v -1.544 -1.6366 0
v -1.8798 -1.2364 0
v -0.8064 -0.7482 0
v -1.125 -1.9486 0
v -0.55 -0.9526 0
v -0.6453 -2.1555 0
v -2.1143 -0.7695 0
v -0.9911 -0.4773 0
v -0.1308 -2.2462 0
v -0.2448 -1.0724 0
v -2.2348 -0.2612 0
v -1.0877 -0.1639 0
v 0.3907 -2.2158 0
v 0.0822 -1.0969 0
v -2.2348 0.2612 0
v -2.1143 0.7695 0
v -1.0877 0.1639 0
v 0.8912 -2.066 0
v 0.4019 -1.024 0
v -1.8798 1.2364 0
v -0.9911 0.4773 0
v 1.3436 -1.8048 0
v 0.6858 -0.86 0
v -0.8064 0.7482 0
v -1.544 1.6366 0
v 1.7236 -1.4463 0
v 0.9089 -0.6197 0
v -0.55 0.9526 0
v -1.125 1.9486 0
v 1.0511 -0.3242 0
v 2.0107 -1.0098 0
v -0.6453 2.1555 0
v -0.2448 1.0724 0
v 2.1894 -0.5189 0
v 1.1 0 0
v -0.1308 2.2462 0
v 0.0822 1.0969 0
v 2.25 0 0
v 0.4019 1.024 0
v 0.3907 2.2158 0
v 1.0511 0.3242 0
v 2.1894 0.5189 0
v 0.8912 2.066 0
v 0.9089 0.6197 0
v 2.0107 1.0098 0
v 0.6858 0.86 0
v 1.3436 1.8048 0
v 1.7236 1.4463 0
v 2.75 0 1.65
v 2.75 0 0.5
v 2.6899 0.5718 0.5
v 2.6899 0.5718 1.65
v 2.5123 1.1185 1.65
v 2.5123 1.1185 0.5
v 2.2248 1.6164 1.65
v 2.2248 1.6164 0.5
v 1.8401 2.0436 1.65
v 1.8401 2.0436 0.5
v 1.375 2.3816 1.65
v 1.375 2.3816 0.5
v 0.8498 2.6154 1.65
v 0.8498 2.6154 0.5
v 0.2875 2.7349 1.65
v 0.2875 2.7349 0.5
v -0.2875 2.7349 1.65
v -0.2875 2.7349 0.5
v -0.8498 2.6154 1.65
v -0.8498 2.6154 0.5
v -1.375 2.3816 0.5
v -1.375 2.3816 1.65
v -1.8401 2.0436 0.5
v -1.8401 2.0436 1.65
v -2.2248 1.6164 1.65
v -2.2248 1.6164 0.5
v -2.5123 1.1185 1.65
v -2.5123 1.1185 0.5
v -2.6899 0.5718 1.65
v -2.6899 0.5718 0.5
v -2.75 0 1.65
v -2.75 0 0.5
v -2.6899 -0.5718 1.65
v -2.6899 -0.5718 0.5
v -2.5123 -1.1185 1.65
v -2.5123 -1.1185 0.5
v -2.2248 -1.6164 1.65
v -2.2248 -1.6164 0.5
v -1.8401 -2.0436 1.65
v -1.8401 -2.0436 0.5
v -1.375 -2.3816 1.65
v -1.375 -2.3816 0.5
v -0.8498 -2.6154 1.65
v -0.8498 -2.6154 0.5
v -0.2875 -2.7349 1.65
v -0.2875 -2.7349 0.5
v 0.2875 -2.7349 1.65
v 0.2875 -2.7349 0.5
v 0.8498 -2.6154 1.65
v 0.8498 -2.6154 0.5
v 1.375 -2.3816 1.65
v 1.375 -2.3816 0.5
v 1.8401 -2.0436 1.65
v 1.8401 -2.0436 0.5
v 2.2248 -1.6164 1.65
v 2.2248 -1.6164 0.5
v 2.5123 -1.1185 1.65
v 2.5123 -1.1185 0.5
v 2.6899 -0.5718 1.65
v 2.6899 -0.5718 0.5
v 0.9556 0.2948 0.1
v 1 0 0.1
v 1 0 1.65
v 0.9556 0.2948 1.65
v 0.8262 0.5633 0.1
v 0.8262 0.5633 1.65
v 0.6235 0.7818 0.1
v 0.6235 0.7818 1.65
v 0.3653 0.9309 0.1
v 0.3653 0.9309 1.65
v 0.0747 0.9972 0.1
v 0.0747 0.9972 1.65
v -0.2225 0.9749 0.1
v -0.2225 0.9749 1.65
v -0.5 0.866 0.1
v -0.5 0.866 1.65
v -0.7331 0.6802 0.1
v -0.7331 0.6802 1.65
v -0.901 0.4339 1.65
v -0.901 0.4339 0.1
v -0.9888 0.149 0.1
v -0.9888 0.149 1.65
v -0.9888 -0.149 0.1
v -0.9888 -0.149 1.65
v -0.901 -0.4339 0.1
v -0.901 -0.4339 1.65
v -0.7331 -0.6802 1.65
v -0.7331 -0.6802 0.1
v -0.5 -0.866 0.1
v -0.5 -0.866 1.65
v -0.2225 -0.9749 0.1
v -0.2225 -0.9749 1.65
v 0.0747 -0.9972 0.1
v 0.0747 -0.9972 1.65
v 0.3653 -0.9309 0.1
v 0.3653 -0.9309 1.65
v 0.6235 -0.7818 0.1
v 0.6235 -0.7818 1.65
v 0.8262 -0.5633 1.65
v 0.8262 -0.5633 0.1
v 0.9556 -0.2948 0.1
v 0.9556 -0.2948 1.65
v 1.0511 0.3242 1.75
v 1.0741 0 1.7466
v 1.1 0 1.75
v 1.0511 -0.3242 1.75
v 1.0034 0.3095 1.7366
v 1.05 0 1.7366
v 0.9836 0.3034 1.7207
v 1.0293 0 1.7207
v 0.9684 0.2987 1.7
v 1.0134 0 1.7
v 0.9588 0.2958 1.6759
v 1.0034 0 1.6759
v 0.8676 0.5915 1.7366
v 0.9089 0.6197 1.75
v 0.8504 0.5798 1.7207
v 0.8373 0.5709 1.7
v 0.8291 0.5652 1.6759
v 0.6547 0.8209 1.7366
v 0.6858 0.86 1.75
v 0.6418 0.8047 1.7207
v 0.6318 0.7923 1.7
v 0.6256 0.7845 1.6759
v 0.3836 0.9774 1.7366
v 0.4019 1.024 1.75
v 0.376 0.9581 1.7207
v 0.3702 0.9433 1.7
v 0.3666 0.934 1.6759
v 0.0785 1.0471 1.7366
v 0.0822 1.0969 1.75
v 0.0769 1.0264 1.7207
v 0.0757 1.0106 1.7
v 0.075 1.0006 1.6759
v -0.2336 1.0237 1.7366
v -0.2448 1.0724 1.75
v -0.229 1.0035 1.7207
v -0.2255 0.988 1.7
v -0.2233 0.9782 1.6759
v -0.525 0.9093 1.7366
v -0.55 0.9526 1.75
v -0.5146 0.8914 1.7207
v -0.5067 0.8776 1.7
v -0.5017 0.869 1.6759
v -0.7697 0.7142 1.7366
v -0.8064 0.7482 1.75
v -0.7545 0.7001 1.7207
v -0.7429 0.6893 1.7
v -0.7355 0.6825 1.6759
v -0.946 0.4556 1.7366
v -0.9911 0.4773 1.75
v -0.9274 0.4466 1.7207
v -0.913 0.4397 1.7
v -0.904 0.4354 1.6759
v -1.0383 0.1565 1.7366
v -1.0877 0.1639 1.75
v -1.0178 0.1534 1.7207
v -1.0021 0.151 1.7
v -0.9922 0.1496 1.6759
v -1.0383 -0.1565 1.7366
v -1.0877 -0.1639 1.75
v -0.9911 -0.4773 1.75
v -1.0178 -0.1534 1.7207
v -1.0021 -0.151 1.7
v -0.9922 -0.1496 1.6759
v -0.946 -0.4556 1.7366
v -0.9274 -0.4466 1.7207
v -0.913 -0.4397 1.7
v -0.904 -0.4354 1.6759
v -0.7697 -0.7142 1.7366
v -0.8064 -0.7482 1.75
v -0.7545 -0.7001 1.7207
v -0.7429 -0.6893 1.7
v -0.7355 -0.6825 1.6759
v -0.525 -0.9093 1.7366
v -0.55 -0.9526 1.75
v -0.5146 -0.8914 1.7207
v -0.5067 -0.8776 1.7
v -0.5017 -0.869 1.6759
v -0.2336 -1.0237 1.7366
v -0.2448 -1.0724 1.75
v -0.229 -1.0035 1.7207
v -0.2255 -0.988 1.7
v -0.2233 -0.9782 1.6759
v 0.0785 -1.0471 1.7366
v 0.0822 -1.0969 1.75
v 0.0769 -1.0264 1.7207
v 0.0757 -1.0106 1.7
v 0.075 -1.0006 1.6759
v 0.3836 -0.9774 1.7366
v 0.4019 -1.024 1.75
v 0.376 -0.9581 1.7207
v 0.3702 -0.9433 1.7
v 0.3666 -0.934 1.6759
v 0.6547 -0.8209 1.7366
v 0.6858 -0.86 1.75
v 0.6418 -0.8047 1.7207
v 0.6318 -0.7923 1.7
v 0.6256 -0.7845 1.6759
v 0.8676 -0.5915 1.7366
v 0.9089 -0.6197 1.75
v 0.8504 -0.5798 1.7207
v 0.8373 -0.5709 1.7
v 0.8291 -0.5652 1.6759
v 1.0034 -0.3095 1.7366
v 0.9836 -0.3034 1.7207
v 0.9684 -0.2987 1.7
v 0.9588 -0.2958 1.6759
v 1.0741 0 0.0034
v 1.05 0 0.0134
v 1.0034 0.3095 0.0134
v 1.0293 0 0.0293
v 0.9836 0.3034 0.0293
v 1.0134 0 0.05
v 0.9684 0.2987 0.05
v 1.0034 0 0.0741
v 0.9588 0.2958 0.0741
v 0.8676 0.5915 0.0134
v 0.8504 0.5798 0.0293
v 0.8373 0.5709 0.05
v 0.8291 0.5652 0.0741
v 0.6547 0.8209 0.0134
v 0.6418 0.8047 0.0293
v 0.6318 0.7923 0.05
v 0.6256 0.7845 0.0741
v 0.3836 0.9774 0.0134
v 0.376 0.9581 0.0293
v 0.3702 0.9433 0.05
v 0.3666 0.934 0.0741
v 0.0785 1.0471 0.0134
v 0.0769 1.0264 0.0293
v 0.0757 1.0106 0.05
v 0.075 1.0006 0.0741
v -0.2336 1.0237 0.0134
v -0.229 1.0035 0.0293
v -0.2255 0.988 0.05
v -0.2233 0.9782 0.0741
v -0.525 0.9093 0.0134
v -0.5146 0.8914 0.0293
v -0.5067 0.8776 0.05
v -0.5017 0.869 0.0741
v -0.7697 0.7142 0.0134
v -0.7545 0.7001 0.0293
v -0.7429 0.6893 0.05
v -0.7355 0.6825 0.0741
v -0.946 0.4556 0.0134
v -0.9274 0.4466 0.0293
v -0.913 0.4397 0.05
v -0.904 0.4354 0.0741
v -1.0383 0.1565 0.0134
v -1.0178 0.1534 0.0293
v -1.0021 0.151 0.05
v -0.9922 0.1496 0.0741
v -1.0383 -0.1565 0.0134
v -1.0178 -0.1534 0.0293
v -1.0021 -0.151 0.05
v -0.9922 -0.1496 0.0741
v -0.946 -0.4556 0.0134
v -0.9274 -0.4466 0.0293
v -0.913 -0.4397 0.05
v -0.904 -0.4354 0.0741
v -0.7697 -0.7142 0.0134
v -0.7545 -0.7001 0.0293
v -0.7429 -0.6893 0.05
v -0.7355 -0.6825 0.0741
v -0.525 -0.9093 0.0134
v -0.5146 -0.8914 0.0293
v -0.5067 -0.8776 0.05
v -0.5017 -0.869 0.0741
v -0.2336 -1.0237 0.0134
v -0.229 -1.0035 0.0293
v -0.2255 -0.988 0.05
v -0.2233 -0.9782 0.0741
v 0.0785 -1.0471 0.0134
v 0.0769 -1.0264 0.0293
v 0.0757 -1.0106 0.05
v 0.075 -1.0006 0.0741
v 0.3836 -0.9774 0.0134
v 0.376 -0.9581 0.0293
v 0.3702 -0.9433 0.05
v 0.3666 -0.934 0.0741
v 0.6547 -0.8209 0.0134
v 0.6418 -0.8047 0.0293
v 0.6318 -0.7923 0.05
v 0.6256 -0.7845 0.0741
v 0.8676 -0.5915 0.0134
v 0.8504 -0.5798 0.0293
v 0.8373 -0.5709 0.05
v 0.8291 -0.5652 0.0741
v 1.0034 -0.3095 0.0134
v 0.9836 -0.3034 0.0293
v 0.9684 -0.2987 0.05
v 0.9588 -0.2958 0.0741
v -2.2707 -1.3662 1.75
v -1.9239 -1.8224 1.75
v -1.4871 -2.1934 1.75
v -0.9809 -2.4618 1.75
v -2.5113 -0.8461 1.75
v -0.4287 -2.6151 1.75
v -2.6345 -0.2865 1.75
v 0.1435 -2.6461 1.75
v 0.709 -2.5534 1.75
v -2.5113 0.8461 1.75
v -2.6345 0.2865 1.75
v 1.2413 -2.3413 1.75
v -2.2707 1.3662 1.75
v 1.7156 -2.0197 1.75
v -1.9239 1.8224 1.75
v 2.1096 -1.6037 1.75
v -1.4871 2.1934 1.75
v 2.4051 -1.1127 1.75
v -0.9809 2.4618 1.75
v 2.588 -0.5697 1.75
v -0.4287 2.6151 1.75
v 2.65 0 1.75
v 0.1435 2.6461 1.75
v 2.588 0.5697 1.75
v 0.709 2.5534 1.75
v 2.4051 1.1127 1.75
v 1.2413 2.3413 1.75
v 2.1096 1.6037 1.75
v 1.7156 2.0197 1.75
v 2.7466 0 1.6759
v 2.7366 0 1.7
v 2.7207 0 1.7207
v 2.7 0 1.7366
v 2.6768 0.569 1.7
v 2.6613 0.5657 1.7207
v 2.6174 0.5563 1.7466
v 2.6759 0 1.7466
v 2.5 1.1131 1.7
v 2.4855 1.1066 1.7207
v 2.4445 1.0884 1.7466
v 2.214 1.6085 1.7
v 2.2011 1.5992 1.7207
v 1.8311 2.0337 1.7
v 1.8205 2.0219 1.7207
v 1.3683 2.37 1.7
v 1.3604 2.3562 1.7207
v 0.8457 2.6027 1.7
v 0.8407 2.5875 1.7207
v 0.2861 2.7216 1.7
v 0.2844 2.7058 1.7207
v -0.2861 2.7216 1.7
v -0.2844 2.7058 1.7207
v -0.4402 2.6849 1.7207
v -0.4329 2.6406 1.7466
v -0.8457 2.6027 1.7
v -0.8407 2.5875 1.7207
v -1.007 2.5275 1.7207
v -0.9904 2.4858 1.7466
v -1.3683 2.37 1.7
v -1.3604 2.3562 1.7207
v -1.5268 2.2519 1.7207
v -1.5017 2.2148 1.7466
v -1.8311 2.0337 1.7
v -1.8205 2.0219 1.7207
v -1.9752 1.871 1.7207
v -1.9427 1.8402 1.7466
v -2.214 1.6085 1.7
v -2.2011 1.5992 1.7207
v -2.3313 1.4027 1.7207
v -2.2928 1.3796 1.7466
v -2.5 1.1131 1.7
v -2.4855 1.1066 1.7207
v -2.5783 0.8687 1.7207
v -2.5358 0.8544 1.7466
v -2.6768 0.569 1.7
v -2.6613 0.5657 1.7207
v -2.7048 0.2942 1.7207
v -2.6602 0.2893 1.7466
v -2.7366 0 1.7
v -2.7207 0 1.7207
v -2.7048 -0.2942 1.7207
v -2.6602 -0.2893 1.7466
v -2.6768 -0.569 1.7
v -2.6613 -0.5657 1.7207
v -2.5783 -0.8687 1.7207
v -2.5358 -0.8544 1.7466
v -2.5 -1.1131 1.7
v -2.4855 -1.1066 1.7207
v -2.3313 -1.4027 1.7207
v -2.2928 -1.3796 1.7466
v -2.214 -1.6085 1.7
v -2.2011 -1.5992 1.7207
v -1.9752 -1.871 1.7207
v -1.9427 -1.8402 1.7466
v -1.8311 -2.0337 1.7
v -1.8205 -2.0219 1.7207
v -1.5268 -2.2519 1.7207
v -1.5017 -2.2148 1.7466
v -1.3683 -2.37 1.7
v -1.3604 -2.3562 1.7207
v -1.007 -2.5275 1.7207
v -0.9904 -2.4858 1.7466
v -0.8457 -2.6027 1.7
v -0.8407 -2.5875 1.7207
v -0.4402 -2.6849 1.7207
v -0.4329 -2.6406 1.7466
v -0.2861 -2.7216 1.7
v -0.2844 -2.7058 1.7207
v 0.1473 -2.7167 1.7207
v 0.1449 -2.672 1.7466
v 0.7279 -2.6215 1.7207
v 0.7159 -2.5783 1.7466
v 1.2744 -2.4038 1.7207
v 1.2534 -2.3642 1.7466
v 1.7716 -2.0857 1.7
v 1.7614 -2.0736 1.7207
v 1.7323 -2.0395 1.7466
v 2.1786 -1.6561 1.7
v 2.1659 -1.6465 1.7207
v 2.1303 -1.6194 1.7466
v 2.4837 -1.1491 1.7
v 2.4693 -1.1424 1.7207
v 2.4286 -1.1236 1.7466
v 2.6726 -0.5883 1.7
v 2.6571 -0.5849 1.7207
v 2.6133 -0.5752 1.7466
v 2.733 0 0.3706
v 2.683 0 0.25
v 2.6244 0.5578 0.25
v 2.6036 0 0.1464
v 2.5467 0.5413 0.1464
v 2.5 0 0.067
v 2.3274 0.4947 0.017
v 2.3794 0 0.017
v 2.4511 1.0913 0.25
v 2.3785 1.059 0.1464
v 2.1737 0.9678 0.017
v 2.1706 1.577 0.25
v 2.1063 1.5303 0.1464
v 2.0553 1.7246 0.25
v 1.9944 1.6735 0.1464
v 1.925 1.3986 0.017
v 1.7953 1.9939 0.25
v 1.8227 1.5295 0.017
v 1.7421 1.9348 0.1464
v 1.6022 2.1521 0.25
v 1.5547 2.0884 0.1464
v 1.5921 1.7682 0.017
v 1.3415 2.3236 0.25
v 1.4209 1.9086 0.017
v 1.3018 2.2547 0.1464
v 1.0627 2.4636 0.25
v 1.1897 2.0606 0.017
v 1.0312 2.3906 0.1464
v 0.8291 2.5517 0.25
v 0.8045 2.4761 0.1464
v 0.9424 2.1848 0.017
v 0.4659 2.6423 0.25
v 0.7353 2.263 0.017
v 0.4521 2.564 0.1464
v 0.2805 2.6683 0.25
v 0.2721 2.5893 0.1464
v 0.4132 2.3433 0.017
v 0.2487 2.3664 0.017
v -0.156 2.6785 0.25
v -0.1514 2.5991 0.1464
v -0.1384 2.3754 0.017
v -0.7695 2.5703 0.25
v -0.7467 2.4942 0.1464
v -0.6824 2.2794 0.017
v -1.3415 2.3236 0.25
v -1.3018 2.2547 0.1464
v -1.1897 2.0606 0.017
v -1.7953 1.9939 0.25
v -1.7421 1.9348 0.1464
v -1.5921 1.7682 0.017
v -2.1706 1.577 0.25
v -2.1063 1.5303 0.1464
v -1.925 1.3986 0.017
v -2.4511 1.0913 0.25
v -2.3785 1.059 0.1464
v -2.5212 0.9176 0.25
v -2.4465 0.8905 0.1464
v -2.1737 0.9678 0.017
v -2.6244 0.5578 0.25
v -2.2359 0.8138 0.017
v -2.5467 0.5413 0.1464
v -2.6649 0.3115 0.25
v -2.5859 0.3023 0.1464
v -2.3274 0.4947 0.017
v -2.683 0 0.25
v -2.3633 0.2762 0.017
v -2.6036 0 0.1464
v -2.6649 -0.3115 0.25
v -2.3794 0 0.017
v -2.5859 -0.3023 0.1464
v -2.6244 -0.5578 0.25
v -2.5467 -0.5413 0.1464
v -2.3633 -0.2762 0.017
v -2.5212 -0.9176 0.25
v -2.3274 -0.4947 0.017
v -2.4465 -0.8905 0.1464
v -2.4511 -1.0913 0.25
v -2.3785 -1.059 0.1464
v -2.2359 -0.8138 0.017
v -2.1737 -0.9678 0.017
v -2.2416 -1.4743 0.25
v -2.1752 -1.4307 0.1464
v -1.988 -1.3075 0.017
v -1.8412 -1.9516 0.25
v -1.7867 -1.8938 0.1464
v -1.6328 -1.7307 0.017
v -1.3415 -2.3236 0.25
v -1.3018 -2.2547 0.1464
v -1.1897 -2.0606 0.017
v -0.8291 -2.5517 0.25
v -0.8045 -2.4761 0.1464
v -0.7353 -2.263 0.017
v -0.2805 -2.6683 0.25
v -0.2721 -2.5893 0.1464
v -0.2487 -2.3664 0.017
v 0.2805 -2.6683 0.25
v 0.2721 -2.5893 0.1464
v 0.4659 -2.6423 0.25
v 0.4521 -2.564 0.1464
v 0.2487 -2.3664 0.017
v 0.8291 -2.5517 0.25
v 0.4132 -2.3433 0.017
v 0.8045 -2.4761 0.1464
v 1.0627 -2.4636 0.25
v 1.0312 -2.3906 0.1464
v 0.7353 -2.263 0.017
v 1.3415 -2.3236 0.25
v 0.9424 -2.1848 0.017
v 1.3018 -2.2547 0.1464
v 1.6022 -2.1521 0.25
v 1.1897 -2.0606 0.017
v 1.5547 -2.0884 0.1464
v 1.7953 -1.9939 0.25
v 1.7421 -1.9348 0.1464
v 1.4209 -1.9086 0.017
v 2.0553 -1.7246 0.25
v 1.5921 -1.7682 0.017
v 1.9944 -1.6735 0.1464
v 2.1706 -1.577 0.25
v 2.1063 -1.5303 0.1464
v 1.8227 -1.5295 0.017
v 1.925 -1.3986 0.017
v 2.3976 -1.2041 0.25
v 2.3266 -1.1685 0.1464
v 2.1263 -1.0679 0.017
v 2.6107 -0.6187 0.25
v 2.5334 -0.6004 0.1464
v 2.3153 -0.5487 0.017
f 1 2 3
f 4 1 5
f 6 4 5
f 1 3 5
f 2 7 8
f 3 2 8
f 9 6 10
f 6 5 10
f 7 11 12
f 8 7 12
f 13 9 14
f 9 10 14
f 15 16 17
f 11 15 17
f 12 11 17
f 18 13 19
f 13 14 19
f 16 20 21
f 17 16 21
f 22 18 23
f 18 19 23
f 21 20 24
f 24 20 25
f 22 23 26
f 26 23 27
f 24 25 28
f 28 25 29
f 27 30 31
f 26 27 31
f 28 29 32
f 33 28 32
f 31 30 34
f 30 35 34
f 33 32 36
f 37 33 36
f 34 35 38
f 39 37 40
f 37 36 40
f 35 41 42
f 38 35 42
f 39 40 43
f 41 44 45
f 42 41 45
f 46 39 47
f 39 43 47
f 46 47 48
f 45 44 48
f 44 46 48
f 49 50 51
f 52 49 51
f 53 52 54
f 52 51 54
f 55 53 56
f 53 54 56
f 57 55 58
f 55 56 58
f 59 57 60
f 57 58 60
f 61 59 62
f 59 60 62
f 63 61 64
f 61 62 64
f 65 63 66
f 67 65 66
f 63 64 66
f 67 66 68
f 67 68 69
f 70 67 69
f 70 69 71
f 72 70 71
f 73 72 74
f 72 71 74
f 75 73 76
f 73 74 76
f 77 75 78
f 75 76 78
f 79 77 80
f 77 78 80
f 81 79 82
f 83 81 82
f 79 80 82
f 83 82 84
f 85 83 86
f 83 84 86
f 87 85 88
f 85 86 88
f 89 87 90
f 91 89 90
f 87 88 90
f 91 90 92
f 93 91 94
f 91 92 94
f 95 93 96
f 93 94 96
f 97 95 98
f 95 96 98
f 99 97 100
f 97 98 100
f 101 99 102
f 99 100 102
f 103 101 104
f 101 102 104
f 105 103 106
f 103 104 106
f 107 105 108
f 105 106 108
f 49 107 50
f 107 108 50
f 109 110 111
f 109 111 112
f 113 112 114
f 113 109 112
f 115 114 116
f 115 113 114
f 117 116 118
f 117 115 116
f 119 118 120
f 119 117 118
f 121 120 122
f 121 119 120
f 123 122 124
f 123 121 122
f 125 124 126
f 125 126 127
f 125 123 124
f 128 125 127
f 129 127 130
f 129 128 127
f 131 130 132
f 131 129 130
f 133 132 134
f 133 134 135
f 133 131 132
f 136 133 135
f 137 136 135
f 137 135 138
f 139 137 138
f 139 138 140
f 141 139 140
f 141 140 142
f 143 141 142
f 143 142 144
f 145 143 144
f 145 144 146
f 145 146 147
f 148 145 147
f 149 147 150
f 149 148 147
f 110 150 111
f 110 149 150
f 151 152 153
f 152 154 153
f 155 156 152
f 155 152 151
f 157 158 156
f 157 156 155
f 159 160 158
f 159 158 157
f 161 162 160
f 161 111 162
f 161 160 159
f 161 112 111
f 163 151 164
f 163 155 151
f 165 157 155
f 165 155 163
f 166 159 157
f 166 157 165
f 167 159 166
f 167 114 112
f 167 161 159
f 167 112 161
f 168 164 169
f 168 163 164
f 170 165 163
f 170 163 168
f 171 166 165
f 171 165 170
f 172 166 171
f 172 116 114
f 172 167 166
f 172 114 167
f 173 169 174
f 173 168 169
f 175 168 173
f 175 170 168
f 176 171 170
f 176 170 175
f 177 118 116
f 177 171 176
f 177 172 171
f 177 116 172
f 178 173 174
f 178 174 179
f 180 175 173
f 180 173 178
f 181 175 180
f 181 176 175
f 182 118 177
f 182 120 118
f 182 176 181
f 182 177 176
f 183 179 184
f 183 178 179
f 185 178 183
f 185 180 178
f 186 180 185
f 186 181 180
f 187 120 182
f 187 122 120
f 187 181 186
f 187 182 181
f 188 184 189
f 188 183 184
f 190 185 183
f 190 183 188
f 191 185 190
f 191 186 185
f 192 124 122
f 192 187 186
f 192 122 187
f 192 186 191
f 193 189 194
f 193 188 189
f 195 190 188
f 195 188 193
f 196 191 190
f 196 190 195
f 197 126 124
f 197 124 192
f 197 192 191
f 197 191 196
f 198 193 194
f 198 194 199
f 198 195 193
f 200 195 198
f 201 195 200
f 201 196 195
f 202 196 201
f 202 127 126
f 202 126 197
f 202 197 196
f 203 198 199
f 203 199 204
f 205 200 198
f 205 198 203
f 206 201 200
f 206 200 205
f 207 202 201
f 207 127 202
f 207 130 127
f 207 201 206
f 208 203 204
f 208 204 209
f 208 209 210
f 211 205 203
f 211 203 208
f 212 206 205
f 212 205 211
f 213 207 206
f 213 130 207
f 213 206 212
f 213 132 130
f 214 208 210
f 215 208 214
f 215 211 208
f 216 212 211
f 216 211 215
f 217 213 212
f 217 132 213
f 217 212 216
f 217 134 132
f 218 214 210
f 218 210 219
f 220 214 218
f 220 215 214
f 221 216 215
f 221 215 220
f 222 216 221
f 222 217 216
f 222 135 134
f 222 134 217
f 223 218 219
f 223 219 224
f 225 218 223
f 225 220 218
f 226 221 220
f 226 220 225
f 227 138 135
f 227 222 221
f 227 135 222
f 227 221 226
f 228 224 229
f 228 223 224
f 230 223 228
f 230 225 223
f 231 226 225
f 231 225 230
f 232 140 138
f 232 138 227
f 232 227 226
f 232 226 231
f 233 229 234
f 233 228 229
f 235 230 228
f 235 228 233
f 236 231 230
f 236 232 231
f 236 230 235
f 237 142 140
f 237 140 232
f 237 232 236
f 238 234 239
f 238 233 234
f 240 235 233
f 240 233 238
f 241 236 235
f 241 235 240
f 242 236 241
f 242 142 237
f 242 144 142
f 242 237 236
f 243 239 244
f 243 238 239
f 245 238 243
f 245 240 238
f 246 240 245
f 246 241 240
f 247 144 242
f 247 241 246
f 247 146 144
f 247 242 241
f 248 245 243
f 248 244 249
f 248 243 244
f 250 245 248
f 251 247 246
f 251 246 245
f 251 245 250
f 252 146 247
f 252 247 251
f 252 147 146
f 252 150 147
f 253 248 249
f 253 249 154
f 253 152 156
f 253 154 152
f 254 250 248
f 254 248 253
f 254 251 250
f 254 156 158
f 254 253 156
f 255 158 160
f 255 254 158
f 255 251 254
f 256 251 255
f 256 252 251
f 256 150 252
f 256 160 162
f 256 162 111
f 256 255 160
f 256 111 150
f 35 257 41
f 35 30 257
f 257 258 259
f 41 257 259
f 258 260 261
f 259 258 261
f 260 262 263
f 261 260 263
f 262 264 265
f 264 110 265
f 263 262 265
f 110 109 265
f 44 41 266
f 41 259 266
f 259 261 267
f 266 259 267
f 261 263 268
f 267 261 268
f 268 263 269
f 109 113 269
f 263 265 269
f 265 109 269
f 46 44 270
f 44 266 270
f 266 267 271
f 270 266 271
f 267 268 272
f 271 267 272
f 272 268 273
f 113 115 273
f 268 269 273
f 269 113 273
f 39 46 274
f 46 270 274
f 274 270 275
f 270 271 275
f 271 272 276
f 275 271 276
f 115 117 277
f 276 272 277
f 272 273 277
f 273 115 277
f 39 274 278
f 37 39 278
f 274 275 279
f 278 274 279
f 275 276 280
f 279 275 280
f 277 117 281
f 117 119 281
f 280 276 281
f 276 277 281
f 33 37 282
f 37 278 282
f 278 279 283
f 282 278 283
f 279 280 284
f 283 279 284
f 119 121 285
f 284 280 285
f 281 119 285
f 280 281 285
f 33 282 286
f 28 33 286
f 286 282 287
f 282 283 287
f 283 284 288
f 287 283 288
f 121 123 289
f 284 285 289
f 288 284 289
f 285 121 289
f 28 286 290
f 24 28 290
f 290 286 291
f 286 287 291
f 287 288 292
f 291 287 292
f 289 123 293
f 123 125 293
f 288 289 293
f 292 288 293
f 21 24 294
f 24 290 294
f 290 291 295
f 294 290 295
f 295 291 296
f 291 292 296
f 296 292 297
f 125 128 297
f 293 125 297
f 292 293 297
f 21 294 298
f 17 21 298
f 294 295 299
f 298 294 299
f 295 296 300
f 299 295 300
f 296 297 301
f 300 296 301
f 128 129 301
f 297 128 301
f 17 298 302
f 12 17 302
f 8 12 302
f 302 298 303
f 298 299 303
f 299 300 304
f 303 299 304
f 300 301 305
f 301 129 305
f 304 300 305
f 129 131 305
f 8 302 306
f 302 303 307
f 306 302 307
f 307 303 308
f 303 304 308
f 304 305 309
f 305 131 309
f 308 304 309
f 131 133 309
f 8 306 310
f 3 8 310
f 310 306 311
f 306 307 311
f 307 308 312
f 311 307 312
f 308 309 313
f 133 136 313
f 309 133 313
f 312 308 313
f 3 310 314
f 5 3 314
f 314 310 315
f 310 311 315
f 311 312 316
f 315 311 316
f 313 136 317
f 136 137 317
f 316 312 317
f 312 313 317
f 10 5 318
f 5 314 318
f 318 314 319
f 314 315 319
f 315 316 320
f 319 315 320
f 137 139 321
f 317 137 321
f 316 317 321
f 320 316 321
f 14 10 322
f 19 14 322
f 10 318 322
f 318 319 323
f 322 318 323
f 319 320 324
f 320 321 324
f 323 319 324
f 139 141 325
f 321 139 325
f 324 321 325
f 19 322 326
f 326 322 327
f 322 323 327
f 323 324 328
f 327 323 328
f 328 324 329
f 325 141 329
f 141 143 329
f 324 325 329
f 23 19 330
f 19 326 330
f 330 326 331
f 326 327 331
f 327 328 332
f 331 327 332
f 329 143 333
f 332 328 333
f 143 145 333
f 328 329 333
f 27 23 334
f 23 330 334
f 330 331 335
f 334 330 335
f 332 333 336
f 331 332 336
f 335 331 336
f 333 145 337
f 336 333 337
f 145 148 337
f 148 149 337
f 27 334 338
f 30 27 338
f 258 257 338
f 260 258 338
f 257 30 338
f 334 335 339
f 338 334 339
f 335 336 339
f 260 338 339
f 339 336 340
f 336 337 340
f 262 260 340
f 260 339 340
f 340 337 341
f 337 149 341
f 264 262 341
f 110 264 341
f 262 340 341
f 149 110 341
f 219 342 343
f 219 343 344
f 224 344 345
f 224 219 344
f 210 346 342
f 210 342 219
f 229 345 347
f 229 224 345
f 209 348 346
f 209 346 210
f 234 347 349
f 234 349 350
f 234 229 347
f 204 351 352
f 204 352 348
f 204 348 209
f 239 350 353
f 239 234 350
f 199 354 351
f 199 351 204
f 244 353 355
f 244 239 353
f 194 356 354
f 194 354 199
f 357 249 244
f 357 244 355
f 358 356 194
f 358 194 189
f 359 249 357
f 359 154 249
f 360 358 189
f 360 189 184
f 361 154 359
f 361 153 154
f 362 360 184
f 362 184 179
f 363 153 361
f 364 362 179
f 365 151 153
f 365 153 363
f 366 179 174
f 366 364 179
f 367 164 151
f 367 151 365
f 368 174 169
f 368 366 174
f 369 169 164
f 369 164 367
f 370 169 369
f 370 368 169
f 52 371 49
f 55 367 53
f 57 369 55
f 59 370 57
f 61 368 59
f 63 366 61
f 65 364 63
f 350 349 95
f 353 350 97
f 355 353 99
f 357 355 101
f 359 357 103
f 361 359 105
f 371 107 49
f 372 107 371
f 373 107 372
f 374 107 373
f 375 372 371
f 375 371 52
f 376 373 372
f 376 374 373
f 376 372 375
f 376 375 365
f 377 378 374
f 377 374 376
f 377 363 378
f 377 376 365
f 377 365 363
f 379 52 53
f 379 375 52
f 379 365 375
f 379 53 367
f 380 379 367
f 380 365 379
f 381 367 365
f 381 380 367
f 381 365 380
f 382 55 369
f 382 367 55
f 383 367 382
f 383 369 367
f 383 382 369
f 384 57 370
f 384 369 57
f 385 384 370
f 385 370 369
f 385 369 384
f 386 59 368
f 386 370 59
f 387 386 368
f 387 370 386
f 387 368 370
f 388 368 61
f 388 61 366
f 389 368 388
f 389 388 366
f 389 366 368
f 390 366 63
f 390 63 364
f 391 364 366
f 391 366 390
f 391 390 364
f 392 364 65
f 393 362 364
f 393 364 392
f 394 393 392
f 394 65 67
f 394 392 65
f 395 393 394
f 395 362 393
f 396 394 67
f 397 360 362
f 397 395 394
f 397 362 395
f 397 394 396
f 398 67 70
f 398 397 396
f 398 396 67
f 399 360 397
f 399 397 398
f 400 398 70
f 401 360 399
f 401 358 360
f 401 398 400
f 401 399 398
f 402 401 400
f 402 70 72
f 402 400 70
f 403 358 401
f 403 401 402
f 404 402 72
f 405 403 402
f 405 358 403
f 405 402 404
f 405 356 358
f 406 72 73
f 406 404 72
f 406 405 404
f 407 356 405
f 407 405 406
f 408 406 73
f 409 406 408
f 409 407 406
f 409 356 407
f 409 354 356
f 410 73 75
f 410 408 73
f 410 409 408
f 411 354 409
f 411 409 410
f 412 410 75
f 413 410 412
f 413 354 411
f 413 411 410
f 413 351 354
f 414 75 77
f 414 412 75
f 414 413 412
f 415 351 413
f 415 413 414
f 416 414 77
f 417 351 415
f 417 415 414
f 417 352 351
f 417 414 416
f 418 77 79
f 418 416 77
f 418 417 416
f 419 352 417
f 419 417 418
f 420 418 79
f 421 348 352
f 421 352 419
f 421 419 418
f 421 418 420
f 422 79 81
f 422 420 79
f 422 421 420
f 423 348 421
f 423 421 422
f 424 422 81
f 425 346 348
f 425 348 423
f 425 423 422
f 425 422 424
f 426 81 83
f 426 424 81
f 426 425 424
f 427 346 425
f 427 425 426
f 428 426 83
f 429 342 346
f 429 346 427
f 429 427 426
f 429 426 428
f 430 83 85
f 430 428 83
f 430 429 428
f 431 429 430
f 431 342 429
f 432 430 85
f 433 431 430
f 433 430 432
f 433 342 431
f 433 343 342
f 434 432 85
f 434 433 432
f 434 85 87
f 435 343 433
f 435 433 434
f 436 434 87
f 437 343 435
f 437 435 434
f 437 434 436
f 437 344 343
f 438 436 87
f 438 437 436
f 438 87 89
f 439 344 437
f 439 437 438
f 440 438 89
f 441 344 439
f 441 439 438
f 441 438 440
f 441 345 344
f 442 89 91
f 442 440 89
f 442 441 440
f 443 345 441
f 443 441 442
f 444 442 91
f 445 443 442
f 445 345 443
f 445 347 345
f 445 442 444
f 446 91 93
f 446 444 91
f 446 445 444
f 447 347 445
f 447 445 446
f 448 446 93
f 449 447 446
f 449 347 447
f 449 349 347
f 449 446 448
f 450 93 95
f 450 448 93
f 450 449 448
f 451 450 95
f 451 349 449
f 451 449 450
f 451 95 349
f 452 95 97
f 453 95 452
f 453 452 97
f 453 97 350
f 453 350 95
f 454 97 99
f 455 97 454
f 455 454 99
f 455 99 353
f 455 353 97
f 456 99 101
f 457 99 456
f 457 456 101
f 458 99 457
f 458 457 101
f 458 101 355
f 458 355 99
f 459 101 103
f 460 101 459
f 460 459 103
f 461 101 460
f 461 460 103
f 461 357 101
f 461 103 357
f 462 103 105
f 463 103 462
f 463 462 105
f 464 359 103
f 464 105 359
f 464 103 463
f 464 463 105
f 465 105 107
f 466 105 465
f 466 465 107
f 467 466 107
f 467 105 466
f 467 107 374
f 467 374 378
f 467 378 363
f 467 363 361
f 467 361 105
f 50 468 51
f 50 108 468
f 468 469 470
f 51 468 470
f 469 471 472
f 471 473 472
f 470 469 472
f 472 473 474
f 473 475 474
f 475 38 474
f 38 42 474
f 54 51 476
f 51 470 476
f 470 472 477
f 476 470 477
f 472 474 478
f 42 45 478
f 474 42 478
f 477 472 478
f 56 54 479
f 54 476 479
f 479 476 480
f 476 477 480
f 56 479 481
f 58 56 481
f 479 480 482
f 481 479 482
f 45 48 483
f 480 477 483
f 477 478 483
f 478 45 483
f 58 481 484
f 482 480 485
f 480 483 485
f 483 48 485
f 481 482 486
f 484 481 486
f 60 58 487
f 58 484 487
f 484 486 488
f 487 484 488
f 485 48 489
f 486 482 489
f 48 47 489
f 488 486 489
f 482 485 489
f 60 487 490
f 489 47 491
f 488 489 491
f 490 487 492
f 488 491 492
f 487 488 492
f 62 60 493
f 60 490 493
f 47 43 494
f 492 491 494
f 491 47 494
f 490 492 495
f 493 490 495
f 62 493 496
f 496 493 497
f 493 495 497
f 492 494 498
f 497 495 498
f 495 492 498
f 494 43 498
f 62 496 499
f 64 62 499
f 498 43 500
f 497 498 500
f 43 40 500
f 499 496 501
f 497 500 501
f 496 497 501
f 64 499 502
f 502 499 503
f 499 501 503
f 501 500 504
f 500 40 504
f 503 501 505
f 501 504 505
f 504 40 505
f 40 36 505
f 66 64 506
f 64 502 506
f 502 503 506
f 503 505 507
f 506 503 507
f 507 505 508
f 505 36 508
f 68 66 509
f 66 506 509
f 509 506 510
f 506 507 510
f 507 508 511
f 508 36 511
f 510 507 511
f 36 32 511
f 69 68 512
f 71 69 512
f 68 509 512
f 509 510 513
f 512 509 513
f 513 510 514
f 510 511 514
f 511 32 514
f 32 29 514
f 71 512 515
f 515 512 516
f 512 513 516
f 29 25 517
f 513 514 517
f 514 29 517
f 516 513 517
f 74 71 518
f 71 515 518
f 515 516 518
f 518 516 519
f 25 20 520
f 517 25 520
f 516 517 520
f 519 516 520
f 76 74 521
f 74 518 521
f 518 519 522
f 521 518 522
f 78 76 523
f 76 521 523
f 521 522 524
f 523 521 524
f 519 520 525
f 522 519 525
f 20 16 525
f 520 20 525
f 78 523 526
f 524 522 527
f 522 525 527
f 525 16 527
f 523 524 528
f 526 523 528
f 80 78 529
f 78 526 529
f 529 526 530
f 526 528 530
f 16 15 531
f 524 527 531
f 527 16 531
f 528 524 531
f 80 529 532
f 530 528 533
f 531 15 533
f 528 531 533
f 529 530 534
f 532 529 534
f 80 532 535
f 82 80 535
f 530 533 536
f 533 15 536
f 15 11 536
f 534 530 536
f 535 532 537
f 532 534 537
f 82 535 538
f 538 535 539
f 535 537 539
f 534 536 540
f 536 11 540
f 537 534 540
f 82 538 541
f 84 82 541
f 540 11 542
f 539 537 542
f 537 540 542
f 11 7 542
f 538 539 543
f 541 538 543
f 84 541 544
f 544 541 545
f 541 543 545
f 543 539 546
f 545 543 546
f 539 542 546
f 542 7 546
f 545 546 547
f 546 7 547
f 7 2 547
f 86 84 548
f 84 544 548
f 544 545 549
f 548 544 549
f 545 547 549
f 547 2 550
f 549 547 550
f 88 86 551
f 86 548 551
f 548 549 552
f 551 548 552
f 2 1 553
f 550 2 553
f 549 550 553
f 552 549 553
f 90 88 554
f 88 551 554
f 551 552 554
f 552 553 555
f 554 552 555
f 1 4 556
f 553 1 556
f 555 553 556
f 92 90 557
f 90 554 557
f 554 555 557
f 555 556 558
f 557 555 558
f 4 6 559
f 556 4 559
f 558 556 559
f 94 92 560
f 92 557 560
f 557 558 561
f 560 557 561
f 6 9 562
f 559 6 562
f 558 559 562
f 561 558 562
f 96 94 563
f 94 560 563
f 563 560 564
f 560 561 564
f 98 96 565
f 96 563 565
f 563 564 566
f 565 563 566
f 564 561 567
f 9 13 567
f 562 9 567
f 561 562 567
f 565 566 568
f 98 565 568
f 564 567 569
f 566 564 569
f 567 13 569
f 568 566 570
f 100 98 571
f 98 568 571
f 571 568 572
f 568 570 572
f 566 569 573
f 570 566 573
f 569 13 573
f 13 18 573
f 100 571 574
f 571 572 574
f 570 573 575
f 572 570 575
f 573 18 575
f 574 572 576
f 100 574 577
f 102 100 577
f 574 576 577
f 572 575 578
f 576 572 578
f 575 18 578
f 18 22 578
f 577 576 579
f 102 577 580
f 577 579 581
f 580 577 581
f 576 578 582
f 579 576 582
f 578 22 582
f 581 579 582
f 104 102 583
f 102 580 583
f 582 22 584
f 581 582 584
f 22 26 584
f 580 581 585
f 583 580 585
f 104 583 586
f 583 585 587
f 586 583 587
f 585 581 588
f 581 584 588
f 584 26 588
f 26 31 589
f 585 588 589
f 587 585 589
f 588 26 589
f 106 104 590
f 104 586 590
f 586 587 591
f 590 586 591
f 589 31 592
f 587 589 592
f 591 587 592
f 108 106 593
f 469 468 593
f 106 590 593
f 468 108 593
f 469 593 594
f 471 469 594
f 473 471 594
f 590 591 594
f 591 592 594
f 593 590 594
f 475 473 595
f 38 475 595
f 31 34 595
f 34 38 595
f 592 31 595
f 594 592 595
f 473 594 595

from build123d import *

# Parameters (mm, degrees)
SKETCH1_R           = 2.75
SKETCH1_R_2         = 1
EXTRUDE_THIN1_DEPTH = 1.75
FILLET1_R           = 0.5
FILLET2_R           = 0.1


with BuildPart() as part:
    # Sketch1 → Extrude-Thin1 (new body)
    with BuildSketch(Plane.XY):
        Circle(SKETCH1_R)
        Circle(SKETCH1_R_2, mode=Mode.SUBTRACT)
    extrude(amount=EXTRUDE_THIN1_DEPTH)

    # Fillet1
    fillet1_edges = [part.edges().sort_by_distance(p)[0] for p in [
        (-2.75, 0, 0),
    ]]
    fillet(fillet1_edges, radius=FILLET1_R)

    # Fillet2
    fillet2_edges = [part.edges().sort_by_distance(p)[0] for p in [
        (-1, 0, 0),
        (-2.75, 0, 1.75),
        (-1, 0, 1.75),
    ]]
    fillet(fillet2_edges, radius=FILLET2_R)


solid = part.part
